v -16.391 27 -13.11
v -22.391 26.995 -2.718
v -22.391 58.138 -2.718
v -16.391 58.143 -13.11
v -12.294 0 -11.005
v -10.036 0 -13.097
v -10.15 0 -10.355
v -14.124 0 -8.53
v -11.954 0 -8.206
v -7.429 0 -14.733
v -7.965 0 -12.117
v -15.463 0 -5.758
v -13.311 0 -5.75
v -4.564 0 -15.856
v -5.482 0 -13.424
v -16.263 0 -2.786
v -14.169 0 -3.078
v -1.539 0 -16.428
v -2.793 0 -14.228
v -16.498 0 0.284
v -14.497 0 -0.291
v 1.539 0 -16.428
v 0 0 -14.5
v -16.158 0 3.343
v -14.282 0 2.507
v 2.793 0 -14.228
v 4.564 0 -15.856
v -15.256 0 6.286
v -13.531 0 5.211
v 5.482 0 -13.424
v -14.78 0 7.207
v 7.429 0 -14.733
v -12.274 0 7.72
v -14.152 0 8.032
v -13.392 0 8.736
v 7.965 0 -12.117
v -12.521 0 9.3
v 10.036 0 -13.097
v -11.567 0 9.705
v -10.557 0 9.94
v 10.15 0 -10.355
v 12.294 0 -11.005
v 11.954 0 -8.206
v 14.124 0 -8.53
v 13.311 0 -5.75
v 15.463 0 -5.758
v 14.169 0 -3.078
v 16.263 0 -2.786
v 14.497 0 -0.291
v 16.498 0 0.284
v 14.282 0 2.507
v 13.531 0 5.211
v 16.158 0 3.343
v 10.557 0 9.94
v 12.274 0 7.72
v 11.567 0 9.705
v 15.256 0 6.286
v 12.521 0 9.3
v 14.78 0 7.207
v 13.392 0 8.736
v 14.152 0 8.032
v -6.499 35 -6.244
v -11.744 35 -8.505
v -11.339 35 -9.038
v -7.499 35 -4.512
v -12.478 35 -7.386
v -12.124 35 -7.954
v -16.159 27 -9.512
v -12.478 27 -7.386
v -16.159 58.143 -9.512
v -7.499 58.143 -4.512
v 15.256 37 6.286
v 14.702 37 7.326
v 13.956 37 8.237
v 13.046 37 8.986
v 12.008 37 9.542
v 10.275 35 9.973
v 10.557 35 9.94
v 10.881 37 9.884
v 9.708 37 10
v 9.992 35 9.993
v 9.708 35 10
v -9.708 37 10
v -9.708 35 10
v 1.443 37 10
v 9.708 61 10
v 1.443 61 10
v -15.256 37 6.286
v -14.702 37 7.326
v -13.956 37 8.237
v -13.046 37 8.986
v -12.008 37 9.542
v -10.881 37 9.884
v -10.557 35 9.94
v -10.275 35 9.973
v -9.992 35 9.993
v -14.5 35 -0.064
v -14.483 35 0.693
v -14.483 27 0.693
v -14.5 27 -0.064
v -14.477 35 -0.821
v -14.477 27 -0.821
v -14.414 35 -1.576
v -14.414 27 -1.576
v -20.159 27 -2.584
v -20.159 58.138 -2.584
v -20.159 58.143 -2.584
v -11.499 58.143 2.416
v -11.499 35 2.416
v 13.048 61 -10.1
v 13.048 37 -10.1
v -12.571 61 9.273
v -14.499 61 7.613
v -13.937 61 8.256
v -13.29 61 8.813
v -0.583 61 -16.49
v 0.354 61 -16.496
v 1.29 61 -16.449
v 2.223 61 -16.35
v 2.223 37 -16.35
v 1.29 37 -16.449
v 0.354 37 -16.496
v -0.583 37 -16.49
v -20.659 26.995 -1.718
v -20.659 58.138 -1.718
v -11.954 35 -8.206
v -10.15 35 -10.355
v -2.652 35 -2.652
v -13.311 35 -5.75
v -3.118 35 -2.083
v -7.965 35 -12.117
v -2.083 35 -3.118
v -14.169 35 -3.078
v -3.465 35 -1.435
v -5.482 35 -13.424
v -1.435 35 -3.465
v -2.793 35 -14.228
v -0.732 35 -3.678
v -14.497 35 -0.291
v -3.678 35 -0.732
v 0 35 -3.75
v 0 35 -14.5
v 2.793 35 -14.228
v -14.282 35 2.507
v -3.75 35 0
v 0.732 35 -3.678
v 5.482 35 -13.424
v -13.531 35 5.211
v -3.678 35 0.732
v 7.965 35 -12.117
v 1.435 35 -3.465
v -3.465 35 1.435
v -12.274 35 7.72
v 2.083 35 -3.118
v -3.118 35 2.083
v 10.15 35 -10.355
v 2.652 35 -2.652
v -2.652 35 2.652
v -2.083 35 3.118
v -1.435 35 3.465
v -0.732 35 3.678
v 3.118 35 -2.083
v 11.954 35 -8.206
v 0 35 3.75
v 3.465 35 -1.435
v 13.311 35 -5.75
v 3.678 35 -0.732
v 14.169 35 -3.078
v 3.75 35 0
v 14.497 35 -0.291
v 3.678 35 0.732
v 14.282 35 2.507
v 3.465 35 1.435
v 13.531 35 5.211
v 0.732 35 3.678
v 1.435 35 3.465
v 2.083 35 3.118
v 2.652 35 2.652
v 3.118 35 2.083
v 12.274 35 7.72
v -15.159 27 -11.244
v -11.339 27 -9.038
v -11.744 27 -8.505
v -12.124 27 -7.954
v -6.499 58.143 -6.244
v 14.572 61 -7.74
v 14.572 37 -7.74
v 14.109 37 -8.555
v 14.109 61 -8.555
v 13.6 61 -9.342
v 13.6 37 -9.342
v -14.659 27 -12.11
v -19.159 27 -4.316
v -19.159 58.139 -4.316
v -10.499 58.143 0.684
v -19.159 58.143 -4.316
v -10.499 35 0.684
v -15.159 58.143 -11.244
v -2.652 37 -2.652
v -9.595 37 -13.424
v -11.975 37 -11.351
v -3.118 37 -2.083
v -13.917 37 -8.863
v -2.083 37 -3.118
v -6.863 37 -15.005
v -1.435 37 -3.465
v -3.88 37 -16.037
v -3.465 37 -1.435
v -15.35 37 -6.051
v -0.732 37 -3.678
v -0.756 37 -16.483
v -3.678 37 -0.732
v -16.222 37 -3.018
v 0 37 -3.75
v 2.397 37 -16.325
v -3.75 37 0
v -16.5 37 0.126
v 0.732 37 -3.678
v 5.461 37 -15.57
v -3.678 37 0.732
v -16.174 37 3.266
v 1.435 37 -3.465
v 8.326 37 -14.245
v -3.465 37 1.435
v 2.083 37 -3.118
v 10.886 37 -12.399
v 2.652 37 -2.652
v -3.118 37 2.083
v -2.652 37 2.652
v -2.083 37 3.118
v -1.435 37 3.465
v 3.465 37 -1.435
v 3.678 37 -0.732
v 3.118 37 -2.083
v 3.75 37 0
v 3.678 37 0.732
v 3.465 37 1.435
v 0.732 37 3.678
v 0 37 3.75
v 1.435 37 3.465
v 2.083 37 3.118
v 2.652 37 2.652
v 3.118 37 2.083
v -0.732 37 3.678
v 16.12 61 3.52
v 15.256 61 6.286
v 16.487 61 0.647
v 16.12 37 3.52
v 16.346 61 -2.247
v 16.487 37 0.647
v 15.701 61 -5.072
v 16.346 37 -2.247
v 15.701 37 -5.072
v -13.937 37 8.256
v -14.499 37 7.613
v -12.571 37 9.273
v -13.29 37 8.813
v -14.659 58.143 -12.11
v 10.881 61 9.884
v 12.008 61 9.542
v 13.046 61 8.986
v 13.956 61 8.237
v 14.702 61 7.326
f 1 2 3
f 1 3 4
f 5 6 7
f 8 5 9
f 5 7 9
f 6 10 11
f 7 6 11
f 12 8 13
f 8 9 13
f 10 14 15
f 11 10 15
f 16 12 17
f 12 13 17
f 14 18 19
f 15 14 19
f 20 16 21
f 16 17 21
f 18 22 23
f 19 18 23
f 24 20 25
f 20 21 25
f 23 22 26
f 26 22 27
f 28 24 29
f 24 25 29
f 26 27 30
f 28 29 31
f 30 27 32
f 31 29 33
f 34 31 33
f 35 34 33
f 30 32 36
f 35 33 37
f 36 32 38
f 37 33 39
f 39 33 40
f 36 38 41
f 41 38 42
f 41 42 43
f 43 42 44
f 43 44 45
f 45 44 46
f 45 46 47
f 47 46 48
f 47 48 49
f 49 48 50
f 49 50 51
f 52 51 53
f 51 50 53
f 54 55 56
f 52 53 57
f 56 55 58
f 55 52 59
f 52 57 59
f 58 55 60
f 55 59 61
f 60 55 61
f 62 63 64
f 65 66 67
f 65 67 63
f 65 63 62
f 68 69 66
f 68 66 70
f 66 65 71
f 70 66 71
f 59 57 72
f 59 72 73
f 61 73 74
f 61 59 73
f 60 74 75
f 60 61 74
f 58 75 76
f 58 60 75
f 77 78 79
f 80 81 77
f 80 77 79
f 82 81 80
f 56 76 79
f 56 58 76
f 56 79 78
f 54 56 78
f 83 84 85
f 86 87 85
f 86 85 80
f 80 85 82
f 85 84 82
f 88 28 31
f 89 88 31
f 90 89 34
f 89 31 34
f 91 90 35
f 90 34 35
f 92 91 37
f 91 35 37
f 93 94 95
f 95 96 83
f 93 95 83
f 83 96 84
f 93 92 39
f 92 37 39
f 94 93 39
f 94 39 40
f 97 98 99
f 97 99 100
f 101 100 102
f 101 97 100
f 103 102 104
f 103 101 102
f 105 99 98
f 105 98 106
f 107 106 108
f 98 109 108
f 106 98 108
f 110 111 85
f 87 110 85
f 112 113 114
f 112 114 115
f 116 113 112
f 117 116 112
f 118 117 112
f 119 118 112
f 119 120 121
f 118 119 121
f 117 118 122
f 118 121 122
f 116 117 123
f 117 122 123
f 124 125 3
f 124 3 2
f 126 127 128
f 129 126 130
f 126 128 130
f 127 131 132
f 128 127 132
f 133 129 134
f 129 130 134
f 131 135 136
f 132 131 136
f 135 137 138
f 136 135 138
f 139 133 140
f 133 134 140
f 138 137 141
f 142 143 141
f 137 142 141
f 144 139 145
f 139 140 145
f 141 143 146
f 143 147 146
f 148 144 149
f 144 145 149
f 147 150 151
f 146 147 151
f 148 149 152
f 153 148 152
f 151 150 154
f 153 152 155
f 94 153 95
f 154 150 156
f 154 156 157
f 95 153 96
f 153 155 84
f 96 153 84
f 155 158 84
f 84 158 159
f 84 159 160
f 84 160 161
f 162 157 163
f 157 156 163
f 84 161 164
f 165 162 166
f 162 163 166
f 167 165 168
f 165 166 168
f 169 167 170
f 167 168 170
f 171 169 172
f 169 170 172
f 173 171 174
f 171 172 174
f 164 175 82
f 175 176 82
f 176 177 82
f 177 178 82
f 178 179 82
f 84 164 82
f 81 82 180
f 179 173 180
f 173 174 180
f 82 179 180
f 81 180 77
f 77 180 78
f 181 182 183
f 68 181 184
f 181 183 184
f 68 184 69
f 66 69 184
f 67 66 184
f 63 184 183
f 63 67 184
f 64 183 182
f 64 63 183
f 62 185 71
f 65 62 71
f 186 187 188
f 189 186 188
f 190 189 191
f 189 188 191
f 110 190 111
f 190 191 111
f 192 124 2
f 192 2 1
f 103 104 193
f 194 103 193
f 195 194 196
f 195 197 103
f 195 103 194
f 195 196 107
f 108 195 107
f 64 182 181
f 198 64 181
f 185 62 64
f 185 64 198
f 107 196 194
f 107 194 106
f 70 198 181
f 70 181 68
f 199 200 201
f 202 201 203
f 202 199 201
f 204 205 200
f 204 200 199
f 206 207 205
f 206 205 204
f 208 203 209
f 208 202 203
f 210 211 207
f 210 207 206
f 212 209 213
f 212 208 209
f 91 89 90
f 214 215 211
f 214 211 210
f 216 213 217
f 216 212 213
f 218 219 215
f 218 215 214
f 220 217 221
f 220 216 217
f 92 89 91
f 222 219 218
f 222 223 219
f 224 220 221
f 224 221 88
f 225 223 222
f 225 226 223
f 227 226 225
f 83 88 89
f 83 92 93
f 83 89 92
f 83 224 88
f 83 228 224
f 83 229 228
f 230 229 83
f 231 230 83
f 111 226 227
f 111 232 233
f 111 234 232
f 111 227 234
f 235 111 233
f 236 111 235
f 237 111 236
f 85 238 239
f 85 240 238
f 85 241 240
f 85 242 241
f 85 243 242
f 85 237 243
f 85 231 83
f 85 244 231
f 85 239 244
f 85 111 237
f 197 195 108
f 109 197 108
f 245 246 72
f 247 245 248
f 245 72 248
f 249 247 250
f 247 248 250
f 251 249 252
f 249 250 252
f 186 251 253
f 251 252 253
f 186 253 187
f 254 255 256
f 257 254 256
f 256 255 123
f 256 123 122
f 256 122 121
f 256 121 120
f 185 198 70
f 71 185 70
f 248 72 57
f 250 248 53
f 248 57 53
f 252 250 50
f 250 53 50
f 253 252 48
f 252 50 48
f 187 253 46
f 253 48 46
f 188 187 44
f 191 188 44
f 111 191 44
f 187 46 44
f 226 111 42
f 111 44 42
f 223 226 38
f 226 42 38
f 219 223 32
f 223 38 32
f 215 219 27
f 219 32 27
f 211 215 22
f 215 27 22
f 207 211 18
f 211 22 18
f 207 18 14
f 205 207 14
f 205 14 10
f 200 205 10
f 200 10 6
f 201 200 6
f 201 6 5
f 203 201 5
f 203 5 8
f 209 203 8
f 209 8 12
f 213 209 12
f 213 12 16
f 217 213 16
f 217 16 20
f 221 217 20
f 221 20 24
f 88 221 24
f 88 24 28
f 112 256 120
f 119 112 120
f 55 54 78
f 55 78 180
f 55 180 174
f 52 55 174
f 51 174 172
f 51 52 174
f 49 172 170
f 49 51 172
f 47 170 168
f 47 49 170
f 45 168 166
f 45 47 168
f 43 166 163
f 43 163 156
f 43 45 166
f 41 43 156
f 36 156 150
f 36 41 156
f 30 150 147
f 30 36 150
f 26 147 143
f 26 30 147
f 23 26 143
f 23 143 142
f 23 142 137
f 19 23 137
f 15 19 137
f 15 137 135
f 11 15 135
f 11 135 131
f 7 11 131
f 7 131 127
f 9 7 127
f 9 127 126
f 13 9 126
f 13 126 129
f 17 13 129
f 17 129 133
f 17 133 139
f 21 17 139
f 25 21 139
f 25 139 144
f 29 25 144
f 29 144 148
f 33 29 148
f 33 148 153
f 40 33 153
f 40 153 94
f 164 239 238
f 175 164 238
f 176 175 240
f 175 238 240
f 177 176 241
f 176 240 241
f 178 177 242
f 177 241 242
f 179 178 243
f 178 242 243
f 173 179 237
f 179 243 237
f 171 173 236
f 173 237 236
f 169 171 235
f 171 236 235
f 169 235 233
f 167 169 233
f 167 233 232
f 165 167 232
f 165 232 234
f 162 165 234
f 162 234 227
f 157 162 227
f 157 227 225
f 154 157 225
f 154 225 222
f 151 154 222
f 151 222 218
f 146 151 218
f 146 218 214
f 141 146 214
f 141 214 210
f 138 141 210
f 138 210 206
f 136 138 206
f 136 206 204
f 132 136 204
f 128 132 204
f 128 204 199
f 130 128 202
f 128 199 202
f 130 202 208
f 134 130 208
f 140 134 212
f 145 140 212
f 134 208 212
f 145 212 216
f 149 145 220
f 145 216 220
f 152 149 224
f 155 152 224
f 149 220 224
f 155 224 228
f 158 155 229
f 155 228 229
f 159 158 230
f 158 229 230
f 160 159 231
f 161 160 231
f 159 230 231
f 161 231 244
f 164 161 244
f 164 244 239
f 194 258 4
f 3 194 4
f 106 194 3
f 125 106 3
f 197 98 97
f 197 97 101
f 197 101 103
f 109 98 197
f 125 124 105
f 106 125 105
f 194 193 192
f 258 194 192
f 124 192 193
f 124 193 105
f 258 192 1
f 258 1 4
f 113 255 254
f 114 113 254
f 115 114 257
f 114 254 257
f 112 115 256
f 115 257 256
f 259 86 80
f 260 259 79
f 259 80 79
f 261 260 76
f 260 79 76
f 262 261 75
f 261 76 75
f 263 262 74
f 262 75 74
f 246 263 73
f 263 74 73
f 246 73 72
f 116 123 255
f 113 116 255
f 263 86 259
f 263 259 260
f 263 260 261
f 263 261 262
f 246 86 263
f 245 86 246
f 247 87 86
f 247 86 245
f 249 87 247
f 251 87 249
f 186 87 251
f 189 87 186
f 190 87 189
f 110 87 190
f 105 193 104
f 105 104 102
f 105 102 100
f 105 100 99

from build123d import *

# Parameters (mm, degrees)
SKETCH_1_R          = 16.5
SKETCH_1_R_2        = 14.5
EXTRUDE_1_DEPTH     = 35
SKETCH_3_R          = 16.5
EXTRUDE_2_DEPTH     = 2
SKETCH_4_W          = 49.747728002
SKETCH_4_H          = 43.690708299
CUT_EXTRUDE_1_DEPTH = 49.40970977
CUT_EXTRUDE_2_REACH = 45.744
SKETCH_5_R          = 3.75
FILLET_1_R          = 6
EXTRUDE_3_DEPTH     = 24
EXTRUDE_3_2_DEPTH   = 24
SKETCH_7_W          = 2
SKETCH_7_H          = 31.142616215
EXTRUDE_4_DEPTH     = 10
EXTRUDE_4_2_DEPTH   = 10
EXTRUDE_5_DEPTH     = 2
EXTRUDE_7_DEPTH     = 24
CUT_EXTRUDE_3_DEPTH = 45.705817321


with BuildPart() as part:
    # 草图1 → 凸台-拉伸1 (new body)
    with BuildSketch(Plane(origin=(0, 0, 0), x_dir=(1, 0, 0), z_dir=(0, 1, 0))):
        with Locations(Location((0, 0, 0), (0, 0, 270))):
            Circle(SKETCH_1_R)
        with Locations(Location((0, 0, 0), (0, 0, 270))):
            Circle(SKETCH_1_R_2, mode=Mode.SUBTRACT)
    extrude(amount=EXTRUDE_1_DEPTH)

    # 草图3 → 凸台-拉伸2 (add)
    with BuildSketch(Plane(origin=(0, 35, 0), x_dir=(1, 0, 0), z_dir=(0, 1, 0))):
        with Locations(Location((0, 0, 0), (0, 0, 270))):
            Circle(SKETCH_3_R)
    extrude(amount=EXTRUDE_2_DEPTH)

    # 草图4 → 切除-拉伸1 (cut, through all)
    with BuildSketch(Plane.XY.offset(10)):
        with Locations((3.540684312, 17.876483266)):
            Rectangle(SKETCH_4_W, SKETCH_4_H)
    extrude(amount=CUT_EXTRUDE_1_DEPTH, mode=Mode.SUBTRACT)

    # 草图5 → 切除-拉伸2 (cut, up to next)
    with BuildSketch(Plane(origin=(0, 37, 0), x_dir=(1, 0, 0), z_dir=(0, 1, 0)), mode=Mode.PRIVATE) as cut_extrude_2_sk1:
        with Locations(Location((0, 0, 0), (0, 0, 270))):
            Circle(SKETCH_5_R)
    cut_extrude_2_tool1 = extrude(cut_extrude_2_sk1.sketch, amount=-CUT_EXTRUDE_2_REACH, mode=Mode.PRIVATE) & part.part
    add(cut_extrude_2_tool1.solids().sort_by_distance((0, 37, 0))[0], mode=Mode.SUBTRACT)

    # 圆角1
    fillet_1_edges = [part.edges().sort_by_distance(p)[0] for p in [
        (13.124404748, 18.5, 10),
        (-13.124404748, 18.5, 10),
    ]]
    fillet(fillet_1_edges, radius=FILLET_1_R)



with BuildPart() as body_2:
    # 草图6 → 凸台-拉伸3 (new body)
    with BuildSketch(Plane(origin=(0, 37, 0), x_dir=(1, 0, 0), z_dir=(0, 1, 0))):
        with BuildLine():
            Line((13.047897801, 10.099621923), (1.443375673, -10))
            Line((1.443375673, -10), (4.330127019, -10))
            Line((4.330127019, -10), (14.5721397, 7.739686335))
            ThreePointArc((14.5721397, 7.739686335), (13.860337004, 8.952153826), (13.047897801, 10.099621923))
        make_face()
    extrude(amount=EXTRUDE_3_DEPTH)


with BuildPart() as body_3:
    # 草图6 → Extrude 3 2 (new body)
    with BuildSketch(Plane(origin=(0, 37, 0), x_dir=(1, 0, 0), z_dir=(0, 1, 0))):
        with BuildLine():
            Line((-0.583304866, 16.489686335), (-14.498767089, -7.612601246))
            ThreePointArc((-14.498767089, -7.612601246), (-13.623792058, -8.546260307), (-12.570735662, -9.273152854))
            Line((-12.570735662, -9.273152854), (2.222580253, 16.349621923))
            ThreePointArc((2.222580253, 16.349621923), (0.82262413, 16.479480864), (-0.583304866, 16.489686335))
        make_face()
    extrude(amount=EXTRUDE_3_2_DEPTH)


with BuildPart() as body_4:
    # 草图7 → 凸台-拉伸4 (new body)
    with BuildSketch(Plane(origin=(-7.577722283, 0, -4.375), x_dir=(-0.5000000000000041, 0, 0.8660254037844364), z_dir=(-0.8660254037844363, 0, -0.500000000000004))):
        with Locations((6.842089612, 42.571308108)):
            Rectangle(SKETCH_7_W, SKETCH_7_H)
    extrude(amount=EXTRUDE_4_DEPTH)

    # 草图8 → 凸台-拉伸5 (add)
    with BuildSketch(Plane(origin=(-16.237976321, 0, -9.375), x_dir=(-0.5000000000000041, 0, 0.8660254037844364), z_dir=(-0.8660254037844364, 0, -0.5000000000000041))):
        Polygon((8.842089612, 58.138003133), (8.842089612, 26.995386917), (-3.157910388, 27), (-3.157910388, 58.142616215), align=None)
    extrude(amount=EXTRUDE_5_DEPTH)


with BuildPart() as body_5:
    # 草图7 → Extrude 4 2 (new body)
    with BuildSketch(Plane(origin=(-7.577722283, 0, -4.375), x_dir=(-0.5000000000000041, 0, 0.8660254037844364), z_dir=(-0.8660254037844363, 0, -0.500000000000004))):
        with Locations((-1.157910388, 42.571308108)):
            Rectangle(SKETCH_7_W, SKETCH_7_H)
    extrude(amount=EXTRUDE_4_2_DEPTH)


with BuildPart() as part_1:
    add(part.part)

    add(body_2.part)  # 凸台-拉伸7 merges body 2
    # 草图9 → 凸台-拉伸7 (add, through all)
    with BuildSketch(Plane(origin=(0, 37, 0), x_dir=(1, 0, 0), z_dir=(0, 1, 0))):
        with BuildLine():
            Line((4.330127019, -10), (9.708243919, -10))
            ThreePointArc((9.708243919, -10), (13.046335761, -8.985693819), (15.255811873, -6.285714286))
            ThreePointArc((15.255811873, -6.285714286), (16.480432015, 0.803343383), (14.5721397, 7.739686335))
            Line((14.5721397, 7.739686335), (4.330127019, -10))
        make_face()
    extrude(amount=EXTRUDE_7_DEPTH)


with BuildPart() as cut_extrude_3_tool:
    # 草图10 → 切除-拉伸3 (new, through all)
    with BuildSketch(Plane.XZ.offset(-35)):
        with BuildLine():
            Line((9.708243919, 10), (-9.708243919, 10))
            ThreePointArc((-9.708243919, 10), (-10.133770704, 9.984891558), (-10.557154474, 9.939642318))
            ThreePointArc((-10.557154474, 9.939642318), (0, -14.5), (10.557154474, 9.939642318))
            ThreePointArc((10.557154474, 9.939642318), (10.133770704, 9.984891558), (9.708243919, 10))
        make_face()
    extrude(amount=CUT_EXTRUDE_3_DEPTH)


with BuildPart() as body_4_1:
    add(body_4.part)

    # 切除-拉伸3: cut by cut_extrude_3_tool
    add(cut_extrude_3_tool.part, mode=Mode.SUBTRACT)


with BuildPart() as body_5_1:
    add(body_5.part)

    # 切除-拉伸3: cut by cut_extrude_3_tool
    add(cut_extrude_3_tool.part, mode=Mode.SUBTRACT)


solid = Compound([body_3.part, part_1.part, body_4_1.part, body_5_1.part])
